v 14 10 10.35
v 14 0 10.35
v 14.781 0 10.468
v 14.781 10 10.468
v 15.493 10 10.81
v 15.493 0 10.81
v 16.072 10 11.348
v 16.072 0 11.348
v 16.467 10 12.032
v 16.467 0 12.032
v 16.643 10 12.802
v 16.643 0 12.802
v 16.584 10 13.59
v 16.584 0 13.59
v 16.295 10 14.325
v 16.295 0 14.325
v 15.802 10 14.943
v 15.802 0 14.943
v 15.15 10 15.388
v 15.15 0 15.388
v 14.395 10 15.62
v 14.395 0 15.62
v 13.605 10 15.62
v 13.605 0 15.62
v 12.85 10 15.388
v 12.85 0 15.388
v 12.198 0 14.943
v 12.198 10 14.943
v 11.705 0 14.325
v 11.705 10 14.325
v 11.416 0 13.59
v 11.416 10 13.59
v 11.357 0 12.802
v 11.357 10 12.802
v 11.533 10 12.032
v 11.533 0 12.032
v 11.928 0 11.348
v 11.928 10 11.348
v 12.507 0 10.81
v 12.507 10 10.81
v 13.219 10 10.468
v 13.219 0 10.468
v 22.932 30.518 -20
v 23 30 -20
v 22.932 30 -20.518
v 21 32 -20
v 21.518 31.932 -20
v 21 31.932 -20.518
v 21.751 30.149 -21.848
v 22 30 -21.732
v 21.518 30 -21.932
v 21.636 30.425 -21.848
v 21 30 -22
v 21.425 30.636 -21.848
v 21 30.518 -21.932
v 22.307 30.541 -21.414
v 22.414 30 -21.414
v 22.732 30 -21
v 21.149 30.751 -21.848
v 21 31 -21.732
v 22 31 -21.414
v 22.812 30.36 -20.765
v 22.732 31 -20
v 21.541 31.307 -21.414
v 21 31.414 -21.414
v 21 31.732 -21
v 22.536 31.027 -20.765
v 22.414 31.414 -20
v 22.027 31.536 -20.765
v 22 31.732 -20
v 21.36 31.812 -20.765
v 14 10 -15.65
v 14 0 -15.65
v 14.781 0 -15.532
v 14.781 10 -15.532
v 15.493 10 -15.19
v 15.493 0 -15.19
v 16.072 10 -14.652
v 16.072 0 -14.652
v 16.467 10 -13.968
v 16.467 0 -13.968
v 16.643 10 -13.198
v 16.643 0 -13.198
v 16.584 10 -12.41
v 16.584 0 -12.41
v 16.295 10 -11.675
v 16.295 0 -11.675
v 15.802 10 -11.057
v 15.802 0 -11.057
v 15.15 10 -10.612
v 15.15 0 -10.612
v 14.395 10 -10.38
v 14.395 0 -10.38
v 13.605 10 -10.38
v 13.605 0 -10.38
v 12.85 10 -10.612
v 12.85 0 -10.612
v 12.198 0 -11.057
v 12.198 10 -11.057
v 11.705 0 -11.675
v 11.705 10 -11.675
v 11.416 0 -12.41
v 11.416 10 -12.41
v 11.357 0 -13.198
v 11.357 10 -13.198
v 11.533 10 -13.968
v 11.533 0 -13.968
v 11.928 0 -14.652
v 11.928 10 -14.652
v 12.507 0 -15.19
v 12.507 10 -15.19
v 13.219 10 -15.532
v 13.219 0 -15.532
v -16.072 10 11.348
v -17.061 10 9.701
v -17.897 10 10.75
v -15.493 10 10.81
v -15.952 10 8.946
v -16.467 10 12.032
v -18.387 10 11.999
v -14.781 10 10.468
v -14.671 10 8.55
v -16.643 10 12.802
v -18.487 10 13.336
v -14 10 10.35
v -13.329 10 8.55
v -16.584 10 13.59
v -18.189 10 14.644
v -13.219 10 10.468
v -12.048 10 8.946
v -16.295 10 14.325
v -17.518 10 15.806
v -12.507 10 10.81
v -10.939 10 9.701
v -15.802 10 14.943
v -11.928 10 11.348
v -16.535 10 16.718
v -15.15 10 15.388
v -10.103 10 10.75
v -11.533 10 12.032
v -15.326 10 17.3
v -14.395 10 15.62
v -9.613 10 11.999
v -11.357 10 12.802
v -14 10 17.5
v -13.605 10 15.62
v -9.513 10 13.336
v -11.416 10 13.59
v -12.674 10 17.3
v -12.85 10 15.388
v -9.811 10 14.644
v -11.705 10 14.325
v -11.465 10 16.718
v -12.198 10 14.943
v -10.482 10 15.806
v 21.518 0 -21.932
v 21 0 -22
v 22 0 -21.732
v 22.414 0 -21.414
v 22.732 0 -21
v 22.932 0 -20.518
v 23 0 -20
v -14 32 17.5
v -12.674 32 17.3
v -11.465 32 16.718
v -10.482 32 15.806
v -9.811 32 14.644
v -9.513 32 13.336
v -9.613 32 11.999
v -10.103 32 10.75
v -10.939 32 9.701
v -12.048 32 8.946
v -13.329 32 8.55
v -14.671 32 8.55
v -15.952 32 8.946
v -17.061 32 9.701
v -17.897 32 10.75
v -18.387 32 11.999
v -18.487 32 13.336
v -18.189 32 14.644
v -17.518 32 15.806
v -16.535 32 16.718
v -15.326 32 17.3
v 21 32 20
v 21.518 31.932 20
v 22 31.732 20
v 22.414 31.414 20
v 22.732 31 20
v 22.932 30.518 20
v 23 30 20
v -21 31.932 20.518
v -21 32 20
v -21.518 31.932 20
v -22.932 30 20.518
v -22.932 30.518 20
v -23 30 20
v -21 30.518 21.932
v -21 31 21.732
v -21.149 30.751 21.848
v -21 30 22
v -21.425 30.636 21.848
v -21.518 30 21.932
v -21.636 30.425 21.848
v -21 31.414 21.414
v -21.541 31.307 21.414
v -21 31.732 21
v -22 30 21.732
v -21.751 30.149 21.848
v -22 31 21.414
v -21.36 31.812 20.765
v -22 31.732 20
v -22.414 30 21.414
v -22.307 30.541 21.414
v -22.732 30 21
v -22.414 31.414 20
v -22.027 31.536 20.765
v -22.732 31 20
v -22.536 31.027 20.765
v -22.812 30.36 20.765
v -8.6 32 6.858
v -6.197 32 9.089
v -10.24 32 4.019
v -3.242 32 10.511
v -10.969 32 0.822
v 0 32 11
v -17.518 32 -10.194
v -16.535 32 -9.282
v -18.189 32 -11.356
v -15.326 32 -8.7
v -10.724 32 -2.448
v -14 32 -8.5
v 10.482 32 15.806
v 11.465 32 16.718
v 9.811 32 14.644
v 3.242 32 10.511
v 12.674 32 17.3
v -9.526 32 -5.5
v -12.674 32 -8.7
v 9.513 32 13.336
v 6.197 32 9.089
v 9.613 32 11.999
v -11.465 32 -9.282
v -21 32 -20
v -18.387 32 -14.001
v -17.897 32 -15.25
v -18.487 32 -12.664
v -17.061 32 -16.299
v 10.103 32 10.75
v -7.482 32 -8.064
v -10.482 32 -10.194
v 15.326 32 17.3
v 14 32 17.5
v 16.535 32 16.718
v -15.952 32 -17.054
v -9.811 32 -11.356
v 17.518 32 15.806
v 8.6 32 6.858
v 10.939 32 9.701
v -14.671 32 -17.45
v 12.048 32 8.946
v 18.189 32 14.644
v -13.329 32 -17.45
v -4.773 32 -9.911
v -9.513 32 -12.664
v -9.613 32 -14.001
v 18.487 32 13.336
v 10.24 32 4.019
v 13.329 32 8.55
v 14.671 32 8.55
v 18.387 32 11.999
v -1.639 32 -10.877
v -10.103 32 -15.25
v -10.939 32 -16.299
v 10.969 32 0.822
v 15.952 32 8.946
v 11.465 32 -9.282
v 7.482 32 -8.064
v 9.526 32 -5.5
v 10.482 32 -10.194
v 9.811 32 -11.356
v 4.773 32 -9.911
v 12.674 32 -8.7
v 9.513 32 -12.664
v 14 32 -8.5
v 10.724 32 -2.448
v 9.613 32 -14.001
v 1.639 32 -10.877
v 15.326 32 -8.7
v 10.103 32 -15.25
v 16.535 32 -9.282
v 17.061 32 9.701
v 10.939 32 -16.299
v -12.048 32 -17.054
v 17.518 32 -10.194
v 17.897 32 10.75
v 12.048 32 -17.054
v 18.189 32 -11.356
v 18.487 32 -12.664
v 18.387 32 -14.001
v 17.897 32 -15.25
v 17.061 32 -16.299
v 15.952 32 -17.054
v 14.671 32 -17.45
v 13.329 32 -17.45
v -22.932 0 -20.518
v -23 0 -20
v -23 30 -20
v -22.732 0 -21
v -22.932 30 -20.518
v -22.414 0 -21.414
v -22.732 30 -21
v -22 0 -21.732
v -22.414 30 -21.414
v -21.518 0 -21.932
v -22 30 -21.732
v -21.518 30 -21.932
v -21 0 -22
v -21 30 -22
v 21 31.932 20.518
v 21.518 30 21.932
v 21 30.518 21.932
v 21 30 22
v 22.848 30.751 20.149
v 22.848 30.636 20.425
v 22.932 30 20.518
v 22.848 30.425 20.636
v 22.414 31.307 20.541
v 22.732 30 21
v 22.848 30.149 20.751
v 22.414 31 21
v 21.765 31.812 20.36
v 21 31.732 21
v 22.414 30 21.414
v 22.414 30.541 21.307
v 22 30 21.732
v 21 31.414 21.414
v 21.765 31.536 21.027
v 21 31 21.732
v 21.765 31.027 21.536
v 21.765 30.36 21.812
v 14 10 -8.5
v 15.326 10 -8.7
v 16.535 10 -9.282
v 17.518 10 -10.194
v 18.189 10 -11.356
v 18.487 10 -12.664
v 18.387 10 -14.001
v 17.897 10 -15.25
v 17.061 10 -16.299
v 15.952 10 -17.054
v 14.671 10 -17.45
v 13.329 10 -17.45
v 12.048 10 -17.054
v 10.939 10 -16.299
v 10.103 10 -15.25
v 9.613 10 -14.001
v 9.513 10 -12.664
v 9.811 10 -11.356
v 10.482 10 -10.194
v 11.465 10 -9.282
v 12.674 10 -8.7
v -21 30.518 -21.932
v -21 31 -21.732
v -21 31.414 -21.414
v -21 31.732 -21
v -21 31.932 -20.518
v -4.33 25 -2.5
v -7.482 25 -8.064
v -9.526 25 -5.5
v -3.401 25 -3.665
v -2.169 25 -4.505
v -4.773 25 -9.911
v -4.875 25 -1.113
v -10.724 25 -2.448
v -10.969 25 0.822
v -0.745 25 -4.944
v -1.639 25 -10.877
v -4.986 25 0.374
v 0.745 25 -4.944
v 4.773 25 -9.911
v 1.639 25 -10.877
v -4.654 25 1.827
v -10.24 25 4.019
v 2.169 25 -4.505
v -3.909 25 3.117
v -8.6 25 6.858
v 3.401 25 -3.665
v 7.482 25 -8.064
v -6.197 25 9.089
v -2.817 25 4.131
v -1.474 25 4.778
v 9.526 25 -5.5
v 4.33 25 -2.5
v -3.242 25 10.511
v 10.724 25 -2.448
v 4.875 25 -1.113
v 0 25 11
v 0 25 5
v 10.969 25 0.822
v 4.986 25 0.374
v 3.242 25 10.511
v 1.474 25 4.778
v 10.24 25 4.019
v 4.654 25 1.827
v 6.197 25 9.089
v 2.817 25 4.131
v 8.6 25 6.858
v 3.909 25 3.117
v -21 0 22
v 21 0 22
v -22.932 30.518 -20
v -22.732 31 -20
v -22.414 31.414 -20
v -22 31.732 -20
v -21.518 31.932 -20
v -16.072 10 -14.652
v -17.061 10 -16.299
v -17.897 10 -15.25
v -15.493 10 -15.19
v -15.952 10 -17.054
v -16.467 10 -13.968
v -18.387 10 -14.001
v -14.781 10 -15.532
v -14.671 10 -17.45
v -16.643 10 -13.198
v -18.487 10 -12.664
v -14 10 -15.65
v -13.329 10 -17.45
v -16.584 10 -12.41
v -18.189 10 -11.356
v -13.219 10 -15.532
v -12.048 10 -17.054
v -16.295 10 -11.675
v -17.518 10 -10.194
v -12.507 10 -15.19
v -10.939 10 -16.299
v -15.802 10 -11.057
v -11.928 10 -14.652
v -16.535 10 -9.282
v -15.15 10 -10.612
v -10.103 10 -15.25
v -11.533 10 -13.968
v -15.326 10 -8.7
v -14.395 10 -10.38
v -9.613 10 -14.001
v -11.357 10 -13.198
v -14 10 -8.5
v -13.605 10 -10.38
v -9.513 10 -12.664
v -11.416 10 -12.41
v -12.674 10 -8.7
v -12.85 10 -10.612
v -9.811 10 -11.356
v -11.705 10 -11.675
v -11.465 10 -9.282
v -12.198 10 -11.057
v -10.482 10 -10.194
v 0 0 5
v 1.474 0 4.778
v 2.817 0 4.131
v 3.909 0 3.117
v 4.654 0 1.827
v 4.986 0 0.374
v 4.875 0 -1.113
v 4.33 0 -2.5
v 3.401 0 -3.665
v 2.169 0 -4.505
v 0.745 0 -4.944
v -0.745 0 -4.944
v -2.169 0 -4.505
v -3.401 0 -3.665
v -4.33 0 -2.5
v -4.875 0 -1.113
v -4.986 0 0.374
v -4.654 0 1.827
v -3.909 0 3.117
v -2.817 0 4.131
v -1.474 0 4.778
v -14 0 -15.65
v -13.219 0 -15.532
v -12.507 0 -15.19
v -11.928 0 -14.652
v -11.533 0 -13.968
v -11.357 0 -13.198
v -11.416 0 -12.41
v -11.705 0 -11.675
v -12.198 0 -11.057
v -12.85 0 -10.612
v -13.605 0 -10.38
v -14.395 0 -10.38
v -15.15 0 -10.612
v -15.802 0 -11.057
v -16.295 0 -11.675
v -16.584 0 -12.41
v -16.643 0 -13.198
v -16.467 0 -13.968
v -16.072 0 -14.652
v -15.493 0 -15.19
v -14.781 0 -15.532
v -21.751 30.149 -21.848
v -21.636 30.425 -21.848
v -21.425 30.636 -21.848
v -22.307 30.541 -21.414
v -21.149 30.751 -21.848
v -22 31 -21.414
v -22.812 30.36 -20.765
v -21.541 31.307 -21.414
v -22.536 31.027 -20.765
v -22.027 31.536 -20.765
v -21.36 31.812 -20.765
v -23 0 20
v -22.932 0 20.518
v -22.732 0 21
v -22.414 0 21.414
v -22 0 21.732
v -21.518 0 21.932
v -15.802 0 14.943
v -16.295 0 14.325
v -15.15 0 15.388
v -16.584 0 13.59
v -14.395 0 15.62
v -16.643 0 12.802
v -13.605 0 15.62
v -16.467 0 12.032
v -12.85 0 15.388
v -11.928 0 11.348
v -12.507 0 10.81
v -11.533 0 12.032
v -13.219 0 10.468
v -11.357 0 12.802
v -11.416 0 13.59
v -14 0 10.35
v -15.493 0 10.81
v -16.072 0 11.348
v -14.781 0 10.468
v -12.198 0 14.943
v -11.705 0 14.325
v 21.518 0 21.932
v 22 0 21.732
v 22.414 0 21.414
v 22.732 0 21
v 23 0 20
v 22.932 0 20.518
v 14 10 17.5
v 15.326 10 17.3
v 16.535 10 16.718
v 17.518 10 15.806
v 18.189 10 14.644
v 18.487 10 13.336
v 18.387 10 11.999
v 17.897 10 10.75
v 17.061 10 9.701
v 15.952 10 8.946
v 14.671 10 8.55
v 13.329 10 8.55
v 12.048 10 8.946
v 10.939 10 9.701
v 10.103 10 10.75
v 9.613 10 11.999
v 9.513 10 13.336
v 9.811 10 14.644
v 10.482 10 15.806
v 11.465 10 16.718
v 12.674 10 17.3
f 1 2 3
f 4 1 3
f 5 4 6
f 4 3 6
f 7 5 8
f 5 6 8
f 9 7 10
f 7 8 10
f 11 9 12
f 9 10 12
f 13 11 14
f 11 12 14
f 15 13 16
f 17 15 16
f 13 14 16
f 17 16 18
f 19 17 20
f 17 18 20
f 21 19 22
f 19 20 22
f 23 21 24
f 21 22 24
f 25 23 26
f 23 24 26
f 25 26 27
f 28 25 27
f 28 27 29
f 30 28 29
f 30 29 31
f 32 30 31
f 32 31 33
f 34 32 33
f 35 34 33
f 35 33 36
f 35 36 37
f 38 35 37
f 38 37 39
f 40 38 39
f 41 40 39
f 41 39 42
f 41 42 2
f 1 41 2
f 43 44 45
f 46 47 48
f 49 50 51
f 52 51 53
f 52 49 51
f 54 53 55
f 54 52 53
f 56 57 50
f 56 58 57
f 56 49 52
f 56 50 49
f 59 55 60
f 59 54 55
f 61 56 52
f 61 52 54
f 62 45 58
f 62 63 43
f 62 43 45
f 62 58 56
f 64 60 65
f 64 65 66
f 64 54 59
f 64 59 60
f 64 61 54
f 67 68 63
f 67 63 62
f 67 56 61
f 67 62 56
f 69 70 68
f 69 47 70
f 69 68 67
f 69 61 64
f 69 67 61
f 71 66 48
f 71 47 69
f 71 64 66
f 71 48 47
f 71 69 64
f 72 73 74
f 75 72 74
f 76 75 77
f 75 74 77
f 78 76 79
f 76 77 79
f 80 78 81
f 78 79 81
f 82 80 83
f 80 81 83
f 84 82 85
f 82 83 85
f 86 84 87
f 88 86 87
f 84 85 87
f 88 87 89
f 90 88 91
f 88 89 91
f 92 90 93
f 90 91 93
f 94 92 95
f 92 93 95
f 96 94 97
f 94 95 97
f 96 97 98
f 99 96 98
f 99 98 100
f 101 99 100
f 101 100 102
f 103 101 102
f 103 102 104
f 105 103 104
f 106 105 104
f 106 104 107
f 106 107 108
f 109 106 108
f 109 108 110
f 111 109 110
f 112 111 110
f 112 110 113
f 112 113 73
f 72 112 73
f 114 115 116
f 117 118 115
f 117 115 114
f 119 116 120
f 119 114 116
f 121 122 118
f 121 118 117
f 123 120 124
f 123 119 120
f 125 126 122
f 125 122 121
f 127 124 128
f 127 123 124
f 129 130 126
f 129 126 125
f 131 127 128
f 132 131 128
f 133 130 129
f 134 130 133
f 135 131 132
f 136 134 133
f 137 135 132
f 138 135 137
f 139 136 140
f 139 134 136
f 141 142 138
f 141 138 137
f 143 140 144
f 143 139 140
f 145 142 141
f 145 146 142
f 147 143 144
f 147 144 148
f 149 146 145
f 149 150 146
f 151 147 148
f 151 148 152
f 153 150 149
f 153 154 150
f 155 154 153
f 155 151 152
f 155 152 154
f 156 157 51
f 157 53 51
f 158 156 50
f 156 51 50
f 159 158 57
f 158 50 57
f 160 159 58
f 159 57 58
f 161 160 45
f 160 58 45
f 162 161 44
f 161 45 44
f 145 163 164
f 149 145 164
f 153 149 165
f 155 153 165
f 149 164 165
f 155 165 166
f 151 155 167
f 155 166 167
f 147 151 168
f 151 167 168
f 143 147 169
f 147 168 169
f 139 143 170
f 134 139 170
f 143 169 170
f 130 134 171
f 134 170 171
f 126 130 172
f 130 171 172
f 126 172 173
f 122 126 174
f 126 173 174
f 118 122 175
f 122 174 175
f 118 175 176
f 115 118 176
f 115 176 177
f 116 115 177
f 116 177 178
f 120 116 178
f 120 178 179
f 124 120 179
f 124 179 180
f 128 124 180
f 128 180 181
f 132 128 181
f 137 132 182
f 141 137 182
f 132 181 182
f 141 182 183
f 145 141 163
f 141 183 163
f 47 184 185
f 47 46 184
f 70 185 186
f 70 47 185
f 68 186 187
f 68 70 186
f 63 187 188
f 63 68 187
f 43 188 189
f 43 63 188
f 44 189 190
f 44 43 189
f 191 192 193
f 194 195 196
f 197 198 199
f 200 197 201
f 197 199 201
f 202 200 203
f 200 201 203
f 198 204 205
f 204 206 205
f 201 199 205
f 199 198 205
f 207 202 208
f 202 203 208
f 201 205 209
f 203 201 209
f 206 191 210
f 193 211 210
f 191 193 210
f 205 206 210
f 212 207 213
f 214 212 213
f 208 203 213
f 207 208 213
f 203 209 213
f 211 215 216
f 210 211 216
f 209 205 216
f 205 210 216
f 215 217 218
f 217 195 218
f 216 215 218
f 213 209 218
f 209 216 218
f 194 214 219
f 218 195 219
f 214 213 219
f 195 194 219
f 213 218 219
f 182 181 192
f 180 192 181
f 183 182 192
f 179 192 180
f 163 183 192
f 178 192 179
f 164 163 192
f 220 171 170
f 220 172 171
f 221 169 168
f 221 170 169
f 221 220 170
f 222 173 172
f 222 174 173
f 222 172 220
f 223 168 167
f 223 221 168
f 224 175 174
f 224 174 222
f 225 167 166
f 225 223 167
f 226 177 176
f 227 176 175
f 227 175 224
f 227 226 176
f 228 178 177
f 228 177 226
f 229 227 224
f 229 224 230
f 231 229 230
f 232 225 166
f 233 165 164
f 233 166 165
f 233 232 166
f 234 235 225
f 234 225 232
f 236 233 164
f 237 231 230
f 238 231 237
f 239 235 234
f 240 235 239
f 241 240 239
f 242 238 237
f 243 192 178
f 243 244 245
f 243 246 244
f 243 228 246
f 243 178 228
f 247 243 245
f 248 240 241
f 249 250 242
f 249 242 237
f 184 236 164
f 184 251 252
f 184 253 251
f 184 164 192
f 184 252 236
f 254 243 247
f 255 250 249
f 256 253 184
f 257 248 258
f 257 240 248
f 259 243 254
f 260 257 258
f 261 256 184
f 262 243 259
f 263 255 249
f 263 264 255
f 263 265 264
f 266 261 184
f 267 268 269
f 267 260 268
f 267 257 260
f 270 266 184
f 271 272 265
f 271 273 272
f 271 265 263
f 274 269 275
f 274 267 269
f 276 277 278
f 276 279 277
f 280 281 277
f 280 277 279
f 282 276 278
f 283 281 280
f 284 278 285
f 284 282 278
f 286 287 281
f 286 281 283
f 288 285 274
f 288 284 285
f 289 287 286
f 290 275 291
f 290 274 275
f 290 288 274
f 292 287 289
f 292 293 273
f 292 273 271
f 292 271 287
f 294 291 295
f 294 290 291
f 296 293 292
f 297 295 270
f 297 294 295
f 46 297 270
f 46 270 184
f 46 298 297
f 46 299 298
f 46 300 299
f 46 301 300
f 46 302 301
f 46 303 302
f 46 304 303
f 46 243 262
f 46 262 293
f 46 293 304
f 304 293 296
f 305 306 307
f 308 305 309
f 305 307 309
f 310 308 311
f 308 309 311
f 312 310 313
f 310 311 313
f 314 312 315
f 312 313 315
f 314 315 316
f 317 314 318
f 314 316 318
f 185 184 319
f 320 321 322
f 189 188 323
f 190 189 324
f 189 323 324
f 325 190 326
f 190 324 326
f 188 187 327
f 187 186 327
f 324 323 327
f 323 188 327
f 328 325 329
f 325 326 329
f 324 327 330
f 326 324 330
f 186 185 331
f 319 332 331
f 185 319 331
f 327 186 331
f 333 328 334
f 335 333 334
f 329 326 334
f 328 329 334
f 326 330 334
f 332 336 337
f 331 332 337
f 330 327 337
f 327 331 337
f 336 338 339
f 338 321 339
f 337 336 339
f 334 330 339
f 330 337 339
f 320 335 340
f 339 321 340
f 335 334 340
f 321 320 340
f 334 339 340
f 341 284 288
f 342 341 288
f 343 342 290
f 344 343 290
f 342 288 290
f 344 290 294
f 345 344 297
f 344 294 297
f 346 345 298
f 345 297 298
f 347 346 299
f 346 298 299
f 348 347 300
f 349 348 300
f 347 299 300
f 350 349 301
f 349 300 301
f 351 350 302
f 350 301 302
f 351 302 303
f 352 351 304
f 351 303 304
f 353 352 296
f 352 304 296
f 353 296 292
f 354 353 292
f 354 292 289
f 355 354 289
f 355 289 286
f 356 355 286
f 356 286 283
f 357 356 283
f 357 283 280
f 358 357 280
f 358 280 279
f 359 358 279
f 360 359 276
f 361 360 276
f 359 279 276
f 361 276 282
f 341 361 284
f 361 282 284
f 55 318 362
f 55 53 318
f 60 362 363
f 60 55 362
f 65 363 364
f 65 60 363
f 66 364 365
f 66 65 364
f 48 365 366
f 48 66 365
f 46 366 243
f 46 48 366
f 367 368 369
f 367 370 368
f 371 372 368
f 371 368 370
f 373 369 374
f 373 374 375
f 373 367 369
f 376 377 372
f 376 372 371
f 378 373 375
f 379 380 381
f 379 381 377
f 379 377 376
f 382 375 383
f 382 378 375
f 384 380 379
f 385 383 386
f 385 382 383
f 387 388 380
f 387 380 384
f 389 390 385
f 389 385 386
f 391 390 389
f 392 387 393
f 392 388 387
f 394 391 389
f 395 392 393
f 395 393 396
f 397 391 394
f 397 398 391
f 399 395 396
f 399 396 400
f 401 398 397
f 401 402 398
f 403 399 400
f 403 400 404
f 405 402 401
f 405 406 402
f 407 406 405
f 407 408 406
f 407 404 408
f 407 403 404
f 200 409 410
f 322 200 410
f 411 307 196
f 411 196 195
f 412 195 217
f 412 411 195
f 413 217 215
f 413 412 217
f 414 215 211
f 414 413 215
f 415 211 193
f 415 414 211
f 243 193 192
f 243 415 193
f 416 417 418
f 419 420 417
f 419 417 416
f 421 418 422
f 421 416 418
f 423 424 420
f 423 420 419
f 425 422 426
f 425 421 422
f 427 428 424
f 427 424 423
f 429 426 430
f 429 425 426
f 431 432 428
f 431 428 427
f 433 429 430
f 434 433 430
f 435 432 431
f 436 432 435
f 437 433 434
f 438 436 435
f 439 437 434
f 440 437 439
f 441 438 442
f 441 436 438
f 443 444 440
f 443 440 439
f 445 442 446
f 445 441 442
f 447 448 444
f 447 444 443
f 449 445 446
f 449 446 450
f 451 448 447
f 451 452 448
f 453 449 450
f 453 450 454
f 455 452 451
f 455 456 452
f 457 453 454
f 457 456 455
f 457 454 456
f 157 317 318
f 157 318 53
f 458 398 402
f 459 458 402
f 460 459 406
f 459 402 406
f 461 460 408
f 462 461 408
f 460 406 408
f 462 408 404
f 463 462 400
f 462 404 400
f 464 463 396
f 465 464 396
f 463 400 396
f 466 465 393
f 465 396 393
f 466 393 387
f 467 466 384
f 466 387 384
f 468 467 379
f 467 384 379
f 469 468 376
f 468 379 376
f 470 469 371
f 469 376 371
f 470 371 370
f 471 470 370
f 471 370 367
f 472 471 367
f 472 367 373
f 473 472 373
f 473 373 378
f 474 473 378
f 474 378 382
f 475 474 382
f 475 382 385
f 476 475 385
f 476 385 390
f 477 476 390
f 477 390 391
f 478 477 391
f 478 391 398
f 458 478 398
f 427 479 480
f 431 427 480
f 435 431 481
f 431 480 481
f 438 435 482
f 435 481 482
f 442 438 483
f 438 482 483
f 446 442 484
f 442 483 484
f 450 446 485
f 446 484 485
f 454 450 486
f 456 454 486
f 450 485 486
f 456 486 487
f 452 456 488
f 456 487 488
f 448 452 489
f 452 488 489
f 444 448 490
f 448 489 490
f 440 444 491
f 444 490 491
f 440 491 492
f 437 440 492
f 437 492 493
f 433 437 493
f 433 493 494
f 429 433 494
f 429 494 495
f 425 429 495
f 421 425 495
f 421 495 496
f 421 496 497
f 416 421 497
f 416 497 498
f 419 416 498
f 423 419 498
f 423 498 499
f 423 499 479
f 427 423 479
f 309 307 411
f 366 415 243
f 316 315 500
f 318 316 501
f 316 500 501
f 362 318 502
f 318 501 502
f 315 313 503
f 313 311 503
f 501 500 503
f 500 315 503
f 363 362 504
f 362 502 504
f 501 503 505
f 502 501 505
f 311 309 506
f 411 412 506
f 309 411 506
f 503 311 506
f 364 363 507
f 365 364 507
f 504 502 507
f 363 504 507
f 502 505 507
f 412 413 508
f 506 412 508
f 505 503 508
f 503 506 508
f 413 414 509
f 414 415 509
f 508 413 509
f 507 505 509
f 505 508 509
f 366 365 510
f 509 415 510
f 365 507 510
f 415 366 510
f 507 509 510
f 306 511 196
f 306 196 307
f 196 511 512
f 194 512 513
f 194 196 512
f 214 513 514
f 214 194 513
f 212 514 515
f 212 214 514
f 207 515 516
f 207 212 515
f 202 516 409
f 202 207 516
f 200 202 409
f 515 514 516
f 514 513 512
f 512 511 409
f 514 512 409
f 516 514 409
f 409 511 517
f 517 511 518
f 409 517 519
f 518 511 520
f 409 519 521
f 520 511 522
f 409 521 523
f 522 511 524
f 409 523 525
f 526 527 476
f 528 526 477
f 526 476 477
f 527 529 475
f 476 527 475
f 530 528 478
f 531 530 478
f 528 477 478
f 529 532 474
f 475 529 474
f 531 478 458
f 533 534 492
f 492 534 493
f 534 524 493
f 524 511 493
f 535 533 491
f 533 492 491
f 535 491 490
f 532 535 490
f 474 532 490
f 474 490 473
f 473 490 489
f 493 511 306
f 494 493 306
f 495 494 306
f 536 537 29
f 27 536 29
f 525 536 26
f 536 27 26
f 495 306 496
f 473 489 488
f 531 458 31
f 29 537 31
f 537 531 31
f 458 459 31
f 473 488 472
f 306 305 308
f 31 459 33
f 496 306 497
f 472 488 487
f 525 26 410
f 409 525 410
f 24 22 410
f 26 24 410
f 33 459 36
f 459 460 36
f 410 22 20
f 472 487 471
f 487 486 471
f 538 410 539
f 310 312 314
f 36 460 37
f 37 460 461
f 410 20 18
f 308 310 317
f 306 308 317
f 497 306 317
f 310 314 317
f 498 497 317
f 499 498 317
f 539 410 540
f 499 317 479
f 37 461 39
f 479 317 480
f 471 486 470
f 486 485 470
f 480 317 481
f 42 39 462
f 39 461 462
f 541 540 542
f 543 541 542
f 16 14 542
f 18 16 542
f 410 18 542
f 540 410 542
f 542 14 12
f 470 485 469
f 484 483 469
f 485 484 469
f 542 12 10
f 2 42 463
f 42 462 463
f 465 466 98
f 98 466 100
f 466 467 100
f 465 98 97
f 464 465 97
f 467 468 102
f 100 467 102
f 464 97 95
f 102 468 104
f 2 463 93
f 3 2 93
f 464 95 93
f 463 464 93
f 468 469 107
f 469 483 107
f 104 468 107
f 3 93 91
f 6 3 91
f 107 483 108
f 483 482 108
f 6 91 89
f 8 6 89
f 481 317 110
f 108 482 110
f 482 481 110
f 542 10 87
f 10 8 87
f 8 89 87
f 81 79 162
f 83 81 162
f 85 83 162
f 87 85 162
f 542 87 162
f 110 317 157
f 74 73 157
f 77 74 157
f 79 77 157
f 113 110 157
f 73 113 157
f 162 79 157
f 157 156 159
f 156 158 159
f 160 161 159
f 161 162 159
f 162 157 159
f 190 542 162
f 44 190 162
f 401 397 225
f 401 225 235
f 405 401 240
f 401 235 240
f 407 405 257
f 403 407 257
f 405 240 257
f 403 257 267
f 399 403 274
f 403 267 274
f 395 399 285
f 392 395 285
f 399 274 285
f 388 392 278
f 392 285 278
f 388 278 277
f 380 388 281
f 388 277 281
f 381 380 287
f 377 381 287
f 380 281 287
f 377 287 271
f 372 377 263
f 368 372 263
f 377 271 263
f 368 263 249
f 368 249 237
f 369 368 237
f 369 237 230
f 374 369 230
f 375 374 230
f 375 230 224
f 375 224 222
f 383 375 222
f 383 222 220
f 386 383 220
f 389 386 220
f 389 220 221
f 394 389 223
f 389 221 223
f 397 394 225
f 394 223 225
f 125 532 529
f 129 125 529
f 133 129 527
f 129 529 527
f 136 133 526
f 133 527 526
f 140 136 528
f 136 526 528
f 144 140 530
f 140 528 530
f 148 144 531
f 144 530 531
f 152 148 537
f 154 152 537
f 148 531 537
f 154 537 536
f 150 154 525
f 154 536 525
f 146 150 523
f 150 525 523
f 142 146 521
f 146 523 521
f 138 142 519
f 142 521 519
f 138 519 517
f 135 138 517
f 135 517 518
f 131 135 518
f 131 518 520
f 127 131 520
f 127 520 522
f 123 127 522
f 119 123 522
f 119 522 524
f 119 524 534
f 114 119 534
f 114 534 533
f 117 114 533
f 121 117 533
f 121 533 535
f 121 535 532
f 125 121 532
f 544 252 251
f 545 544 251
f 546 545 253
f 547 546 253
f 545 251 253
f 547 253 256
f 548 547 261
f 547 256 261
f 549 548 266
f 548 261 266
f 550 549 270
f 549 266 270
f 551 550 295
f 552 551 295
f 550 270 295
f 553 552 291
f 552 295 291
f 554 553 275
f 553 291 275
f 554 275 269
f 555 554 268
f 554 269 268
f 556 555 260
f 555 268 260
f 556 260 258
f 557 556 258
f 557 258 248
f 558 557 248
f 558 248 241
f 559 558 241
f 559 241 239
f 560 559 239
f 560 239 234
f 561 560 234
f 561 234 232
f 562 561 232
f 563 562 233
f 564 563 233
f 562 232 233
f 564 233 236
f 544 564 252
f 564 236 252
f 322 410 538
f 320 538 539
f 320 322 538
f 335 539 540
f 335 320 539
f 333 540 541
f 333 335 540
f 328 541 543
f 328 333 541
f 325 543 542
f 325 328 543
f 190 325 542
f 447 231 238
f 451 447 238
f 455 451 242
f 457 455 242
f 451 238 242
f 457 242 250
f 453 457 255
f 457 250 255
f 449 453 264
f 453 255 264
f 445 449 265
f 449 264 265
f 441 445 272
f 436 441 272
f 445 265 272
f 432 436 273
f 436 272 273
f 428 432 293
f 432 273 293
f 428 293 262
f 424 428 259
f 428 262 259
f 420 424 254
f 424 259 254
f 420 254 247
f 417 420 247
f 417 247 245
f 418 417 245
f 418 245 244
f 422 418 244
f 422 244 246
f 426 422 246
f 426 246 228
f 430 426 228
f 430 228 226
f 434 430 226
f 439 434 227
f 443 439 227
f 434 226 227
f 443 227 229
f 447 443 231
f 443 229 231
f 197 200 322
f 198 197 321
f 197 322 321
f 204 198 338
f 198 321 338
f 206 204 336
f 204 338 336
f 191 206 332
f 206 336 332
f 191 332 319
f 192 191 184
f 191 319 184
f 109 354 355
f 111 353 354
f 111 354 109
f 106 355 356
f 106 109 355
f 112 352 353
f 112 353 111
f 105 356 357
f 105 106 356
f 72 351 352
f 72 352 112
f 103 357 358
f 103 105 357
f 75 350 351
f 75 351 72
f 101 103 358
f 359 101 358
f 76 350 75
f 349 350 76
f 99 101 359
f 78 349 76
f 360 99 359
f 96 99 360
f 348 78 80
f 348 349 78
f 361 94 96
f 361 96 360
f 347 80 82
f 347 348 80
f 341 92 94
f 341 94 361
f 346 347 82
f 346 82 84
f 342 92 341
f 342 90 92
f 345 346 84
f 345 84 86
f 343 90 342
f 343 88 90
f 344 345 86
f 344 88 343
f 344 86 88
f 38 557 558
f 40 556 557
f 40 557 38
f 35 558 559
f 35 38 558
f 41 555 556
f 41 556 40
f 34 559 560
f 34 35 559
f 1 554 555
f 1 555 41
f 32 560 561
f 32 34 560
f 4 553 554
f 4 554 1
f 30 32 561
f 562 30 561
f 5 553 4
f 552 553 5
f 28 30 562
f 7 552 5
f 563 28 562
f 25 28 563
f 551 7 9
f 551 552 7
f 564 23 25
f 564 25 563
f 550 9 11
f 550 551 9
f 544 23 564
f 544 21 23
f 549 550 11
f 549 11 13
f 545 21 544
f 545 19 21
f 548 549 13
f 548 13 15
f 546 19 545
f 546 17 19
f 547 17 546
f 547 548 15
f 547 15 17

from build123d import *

# Parameters (mm, degrees)
SKETCH1_W            = 46
SKETCH1_H            = 44
BOSS_EXTRUDE1_DEPTH  = 32
SKETCH2_R            = 2.65
CUT_EXTRUDE1_DEPTH   = 46.133136386
LPATTERN1_COUNT      = 2
LPATTERN1_PITCH      = 26
LPATTERN1_COUNT_DIR2 = 2
LPATTERN1_PITCH_DIR2 = 28
SKETCH3_R            = 11
CUT_EXTRUDE2_DEPTH   = 7
FILLET1_R            = 2
SKETCH4_R            = 4.5
CUT_EXTRUDE3_DEPTH   = 22
LPATTERN2_COUNT      = 2
LPATTERN2_PITCH      = 28
LPATTERN2_COUNT_DIR2 = 2
LPATTERN2_PITCH_DIR2 = 26
SKETCH5_R            = 5
CUT_EXTRUDE4_DEPTH   = 46.133136386


with BuildPart() as part:
    # Sketch1 → Boss-Extrude1 (new body)
    with BuildSketch(Plane(origin=(0, 0, 0), x_dir=(1, 0, 0), z_dir=(0, 1, 0))):
        Rectangle(SKETCH1_W, SKETCH1_H)
    extrude(amount=BOSS_EXTRUDE1_DEPTH)

    # Sketch2 → Cut-Extrude1 (cut, through all)
    with BuildSketch(Plane.XZ):
        with Locations(Location((-14, -13, 0), (0, 0, 270))):
            Circle(SKETCH2_R)
    cut_extrude1 = extrude(amount=-CUT_EXTRUDE1_DEPTH, mode=Mode.SUBTRACT)

    # LPattern1: Cut-Extrude1 2 × 2
    with Locations(*[(j * LPATTERN1_PITCH_DIR2, 0, i * LPATTERN1_PITCH) for i in range(LPATTERN1_COUNT) for j in range(LPATTERN1_COUNT_DIR2) if (i, j) != (0, 0)]):
        add(cut_extrude1, mode=Mode.SUBTRACT)

    # Sketch3 → Cut-Extrude2 (cut)
    with BuildSketch(Plane(origin=(0, 32, 0), x_dir=(1, 0, 0), z_dir=(0, 1, 0))):
        with Locations(Location((0, 0, 0), (0, 0, 270))):
            Circle(SKETCH3_R)
    extrude(amount=-CUT_EXTRUDE2_DEPTH, mode=Mode.SUBTRACT)

    # Fillet1
    fillet1_edges = [part.edges().sort_by_distance(p)[0] for p in [
        (-23, 32, 0),
        (0, 32, 22),
        (23, 32, 0),
        (23, 16, 22),
        (-23, 16, 22),
        (-23, 16, -22),
        (23, 16, -22),
        (0, 32, -22),
    ]]
    fillet(fillet1_edges, radius=FILLET1_R)

    # Sketch4 → Cut-Extrude3 (cut)
    with BuildSketch(Plane(origin=(0, 32, 0), x_dir=(1, 0, 0), z_dir=(0, 1, 0))):
        with Locations(Location((14, -13, 0), (0, 0, 270))):
            Circle(SKETCH4_R)
    cut_extrude3 = extrude(amount=-CUT_EXTRUDE3_DEPTH, mode=Mode.SUBTRACT)

    # LPattern2: Cut-Extrude3 2 × 2
    with Locations(*[(-i * LPATTERN2_PITCH, 0, -j * LPATTERN2_PITCH_DIR2) for i in range(LPATTERN2_COUNT) for j in range(LPATTERN2_COUNT_DIR2) if (i, j) != (0, 0)]):
        add(cut_extrude3, mode=Mode.SUBTRACT)

    # Sketch5 → Cut-Extrude4 (cut, through all)
    with BuildSketch(Plane(origin=(0, 32, 0), x_dir=(1, 0, 0), z_dir=(0, 1, 0))):
        with Locations(Location((0, 0, 0), (0, 0, 270))):
            Circle(SKETCH5_R)
    extrude(amount=-CUT_EXTRUDE4_DEPTH, mode=Mode.SUBTRACT)


solid = part.part
